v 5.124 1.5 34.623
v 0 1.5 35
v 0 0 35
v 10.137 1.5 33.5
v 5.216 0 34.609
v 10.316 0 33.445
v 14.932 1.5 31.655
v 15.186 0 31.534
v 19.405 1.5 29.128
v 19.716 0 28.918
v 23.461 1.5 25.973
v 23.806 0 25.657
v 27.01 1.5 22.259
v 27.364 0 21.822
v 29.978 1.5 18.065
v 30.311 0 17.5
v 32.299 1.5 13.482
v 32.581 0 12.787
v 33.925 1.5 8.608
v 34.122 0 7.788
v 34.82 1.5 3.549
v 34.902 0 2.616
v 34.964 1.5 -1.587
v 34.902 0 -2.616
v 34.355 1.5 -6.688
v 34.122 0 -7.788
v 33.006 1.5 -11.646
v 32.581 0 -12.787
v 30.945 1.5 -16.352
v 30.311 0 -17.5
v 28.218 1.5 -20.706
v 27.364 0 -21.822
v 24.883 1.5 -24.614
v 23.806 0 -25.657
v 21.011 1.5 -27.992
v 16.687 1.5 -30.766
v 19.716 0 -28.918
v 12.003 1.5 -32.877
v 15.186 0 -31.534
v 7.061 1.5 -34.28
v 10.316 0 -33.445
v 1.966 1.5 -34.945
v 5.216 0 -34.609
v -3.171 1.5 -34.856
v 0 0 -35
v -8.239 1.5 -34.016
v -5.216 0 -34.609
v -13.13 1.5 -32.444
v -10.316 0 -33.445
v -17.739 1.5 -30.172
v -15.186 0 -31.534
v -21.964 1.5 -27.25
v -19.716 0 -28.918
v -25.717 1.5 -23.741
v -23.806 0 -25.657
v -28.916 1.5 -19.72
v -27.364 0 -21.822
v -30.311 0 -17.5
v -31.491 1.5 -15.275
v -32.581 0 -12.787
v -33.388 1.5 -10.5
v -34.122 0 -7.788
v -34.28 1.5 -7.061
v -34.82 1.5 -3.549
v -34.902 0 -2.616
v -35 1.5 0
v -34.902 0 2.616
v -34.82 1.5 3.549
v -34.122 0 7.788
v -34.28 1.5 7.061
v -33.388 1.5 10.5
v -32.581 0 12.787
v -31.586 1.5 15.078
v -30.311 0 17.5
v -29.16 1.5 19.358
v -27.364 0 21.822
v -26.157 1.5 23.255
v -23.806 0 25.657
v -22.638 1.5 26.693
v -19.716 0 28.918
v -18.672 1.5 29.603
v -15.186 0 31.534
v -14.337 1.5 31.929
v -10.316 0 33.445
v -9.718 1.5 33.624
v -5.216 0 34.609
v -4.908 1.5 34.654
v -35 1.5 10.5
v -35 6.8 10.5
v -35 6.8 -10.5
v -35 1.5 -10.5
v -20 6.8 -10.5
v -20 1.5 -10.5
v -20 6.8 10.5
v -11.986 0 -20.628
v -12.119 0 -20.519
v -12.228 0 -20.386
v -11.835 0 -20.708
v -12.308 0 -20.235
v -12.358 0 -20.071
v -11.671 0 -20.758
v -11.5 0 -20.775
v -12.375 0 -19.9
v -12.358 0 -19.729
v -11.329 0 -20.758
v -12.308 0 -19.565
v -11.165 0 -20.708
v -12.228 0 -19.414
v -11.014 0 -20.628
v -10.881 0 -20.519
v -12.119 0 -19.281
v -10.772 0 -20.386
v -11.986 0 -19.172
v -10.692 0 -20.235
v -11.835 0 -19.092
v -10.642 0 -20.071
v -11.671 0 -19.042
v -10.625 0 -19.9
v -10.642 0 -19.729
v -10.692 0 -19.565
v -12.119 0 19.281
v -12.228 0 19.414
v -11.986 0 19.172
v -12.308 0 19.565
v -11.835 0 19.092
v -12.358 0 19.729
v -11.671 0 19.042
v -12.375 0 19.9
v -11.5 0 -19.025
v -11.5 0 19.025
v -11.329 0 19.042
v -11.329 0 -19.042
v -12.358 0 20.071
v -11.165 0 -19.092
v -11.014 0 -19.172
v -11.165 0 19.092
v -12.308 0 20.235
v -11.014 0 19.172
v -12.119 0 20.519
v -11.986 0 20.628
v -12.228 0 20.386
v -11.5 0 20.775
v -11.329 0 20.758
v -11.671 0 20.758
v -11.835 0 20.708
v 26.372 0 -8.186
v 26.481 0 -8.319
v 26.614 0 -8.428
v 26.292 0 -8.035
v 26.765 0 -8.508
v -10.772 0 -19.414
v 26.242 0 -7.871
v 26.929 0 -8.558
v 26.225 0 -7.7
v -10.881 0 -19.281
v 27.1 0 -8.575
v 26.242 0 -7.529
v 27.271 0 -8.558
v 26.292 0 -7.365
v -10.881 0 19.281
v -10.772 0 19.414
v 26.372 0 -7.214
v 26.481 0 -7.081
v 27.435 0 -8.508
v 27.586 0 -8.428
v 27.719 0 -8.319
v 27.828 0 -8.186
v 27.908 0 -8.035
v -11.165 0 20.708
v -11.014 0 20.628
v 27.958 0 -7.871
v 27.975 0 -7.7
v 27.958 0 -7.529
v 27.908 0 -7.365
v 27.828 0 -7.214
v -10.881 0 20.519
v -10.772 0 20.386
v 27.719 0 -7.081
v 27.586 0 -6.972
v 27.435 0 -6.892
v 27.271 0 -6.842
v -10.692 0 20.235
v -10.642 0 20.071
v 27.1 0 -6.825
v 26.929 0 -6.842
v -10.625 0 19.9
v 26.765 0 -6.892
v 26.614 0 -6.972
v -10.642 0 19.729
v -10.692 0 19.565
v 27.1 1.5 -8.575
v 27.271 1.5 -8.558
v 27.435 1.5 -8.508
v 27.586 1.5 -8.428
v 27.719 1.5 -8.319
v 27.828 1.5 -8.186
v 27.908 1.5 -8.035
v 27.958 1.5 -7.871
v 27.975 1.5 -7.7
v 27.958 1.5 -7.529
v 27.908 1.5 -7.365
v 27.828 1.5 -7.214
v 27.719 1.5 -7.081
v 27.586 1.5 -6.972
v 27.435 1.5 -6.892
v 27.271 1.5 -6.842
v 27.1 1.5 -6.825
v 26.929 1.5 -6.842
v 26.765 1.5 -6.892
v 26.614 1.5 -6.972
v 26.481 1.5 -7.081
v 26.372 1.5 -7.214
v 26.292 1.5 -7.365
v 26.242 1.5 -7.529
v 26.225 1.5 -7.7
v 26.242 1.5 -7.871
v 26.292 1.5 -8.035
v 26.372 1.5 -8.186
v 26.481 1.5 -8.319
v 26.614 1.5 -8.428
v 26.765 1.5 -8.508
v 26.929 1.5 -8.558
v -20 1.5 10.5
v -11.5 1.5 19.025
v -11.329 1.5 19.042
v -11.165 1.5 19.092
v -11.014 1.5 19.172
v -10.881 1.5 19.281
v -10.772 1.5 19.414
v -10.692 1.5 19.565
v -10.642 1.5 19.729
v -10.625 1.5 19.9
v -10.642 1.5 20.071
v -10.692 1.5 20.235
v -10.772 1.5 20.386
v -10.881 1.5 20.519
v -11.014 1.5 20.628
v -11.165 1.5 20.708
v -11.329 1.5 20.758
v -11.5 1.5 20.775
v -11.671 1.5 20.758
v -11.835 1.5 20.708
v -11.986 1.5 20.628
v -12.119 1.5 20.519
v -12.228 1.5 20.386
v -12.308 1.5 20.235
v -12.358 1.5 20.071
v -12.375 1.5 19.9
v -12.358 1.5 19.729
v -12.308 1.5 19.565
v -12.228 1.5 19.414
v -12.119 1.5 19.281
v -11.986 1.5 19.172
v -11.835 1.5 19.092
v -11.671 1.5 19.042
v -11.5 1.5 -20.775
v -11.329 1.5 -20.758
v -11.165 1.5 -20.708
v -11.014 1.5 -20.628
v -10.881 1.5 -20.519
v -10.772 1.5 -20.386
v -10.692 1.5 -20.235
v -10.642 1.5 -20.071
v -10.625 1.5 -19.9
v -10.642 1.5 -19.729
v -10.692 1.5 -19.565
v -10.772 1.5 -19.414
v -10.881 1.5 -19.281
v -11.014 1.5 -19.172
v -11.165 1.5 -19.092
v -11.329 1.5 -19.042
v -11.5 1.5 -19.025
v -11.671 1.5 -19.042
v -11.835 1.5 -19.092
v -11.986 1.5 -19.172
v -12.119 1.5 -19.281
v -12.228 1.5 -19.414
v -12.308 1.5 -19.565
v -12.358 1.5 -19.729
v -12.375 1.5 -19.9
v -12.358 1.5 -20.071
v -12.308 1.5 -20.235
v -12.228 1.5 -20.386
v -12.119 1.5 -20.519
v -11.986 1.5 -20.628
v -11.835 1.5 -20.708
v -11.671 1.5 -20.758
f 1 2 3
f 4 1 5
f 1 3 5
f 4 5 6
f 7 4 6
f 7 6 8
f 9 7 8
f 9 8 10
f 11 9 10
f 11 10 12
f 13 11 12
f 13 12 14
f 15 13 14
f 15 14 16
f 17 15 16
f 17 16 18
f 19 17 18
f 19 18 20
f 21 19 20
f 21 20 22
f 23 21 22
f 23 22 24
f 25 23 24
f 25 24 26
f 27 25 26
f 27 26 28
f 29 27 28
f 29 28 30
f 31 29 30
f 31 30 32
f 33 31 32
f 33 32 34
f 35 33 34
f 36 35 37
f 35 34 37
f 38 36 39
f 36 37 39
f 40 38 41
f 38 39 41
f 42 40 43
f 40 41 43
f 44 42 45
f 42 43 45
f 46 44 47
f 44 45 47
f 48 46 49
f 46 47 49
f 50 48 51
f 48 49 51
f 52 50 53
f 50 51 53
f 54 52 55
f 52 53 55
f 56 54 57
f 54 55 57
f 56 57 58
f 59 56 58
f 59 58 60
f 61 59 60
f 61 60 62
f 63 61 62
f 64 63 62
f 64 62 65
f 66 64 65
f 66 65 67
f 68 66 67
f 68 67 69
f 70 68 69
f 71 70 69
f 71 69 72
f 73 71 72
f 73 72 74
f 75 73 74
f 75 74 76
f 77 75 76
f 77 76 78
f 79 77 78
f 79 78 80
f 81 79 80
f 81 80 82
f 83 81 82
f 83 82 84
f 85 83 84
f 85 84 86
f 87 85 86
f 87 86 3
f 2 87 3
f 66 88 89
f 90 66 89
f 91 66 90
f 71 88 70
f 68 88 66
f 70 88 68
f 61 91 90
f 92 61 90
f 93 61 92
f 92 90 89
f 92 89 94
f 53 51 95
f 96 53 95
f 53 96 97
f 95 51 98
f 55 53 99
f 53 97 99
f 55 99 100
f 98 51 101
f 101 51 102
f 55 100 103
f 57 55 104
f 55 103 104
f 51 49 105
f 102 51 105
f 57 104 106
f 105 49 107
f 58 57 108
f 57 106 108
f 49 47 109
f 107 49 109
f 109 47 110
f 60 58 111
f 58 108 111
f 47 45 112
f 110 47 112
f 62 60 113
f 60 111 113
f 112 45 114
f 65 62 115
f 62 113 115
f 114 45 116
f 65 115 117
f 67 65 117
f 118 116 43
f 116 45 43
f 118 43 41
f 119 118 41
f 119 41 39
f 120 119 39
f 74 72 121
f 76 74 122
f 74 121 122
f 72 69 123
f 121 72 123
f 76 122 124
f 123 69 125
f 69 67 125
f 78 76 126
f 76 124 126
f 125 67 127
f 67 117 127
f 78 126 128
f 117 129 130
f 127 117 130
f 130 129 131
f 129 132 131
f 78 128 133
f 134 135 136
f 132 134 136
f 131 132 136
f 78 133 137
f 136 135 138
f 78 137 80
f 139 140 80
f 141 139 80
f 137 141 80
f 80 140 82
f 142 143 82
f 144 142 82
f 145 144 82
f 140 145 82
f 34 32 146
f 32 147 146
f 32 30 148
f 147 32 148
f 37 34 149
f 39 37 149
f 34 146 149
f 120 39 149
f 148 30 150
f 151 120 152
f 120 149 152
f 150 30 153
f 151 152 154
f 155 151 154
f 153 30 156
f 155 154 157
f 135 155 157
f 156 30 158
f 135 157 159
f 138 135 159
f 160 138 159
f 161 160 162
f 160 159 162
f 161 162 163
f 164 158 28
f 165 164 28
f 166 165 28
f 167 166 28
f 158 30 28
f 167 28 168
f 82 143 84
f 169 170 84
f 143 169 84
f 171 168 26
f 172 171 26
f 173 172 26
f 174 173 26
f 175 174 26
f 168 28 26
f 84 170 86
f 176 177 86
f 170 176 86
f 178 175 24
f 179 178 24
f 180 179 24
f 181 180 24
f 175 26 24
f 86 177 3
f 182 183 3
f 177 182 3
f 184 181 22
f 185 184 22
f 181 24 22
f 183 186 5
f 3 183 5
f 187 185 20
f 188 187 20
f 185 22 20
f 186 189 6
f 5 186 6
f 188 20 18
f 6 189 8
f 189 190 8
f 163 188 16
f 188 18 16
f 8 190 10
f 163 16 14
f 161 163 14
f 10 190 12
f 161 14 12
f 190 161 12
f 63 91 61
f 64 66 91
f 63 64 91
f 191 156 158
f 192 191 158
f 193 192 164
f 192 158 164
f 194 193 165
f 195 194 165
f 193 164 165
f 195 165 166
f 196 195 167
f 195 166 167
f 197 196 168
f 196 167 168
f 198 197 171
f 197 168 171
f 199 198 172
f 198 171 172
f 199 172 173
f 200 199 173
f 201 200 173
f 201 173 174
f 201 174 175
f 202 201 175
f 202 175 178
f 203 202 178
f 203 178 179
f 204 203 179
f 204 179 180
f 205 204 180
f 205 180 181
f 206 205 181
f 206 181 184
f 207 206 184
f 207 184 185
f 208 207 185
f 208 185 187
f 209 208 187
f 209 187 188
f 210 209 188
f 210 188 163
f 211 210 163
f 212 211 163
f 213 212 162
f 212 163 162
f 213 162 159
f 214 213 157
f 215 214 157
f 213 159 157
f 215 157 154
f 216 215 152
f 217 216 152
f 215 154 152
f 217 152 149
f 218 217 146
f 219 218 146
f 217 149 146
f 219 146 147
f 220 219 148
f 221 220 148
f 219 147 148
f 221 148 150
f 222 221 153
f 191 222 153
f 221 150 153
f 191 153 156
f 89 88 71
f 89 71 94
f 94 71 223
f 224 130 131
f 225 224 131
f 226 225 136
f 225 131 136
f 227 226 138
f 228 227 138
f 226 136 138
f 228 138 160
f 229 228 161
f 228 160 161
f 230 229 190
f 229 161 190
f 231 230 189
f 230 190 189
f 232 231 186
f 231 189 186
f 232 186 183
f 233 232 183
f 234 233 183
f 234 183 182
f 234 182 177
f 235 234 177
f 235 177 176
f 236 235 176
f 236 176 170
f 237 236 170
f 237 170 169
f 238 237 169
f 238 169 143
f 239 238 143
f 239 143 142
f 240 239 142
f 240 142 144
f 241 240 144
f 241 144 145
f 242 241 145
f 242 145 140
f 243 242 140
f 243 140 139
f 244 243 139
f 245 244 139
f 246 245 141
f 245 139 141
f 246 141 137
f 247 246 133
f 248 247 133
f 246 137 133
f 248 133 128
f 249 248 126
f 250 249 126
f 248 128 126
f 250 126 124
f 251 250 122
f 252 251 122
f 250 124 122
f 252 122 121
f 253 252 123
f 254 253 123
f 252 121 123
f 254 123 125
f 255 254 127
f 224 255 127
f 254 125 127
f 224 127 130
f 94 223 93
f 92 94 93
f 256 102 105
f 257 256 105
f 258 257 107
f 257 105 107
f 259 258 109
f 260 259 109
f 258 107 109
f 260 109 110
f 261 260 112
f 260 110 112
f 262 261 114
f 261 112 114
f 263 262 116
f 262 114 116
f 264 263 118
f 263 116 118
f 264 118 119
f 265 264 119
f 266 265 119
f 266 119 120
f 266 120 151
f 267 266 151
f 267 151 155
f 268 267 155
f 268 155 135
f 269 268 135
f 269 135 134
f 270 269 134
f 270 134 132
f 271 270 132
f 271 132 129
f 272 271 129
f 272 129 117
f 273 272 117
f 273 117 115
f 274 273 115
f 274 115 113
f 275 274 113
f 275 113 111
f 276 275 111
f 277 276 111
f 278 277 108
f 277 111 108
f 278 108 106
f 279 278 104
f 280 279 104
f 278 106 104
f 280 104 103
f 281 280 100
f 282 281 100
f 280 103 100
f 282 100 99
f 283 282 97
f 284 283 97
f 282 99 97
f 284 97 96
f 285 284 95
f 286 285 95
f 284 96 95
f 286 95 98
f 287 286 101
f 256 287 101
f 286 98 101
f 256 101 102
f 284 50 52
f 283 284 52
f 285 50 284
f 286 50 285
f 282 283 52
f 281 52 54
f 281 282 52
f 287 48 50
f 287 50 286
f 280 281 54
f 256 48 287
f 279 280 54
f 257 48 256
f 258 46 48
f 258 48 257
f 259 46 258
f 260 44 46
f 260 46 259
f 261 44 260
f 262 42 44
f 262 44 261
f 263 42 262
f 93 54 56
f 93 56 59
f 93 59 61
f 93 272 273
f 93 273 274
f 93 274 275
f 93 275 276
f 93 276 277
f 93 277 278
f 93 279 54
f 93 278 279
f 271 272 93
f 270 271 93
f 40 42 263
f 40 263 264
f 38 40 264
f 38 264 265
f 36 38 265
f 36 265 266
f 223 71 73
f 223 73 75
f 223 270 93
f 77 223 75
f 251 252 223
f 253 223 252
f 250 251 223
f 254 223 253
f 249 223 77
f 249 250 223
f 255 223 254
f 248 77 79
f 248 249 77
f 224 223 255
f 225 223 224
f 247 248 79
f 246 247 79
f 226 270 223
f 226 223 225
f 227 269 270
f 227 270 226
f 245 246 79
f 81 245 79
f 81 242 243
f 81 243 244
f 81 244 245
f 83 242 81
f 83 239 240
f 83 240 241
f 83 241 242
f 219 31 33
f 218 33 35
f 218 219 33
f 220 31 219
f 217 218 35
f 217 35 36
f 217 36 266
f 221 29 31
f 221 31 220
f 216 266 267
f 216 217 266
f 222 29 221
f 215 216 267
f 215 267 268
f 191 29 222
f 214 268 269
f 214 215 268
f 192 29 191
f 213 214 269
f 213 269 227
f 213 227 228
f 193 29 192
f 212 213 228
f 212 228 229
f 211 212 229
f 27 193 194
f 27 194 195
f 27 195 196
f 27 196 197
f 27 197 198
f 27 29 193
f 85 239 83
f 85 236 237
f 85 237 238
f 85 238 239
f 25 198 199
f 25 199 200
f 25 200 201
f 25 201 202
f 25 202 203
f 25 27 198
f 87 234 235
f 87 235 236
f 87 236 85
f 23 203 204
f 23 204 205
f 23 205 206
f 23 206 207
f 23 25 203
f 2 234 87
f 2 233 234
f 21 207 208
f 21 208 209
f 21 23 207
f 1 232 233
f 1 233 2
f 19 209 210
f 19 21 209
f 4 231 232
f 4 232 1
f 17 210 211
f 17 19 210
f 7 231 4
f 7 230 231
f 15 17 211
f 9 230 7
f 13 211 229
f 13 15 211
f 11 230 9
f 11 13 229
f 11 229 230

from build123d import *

# Parameters (mm, degrees)
SKETCH1_R                      = 35
BOSS_EXTRUDE1_DEPTH            = 1.5
SKETCH4_W                      = 15
SKETCH4_H                      = 21
BOSS_EXTRUDE2_DEPTH            = 5.3
TAP_DRILL_FOR_M2_2X0_45_TAP1_D = 1.75


with BuildPart() as part:
    # Sketch1 → Boss-Extrude1 (new body)
    with BuildSketch(Plane(origin=(0, 0, 0), x_dir=(1, 0, 0), z_dir=(0, 1, 0))):
        with Locations(Location((0, 0, 0), (0, 0, 270))):
            Circle(SKETCH1_R)
    extrude(amount=BOSS_EXTRUDE1_DEPTH)

    # Sketch4 → Boss-Extrude2 (add)
    with BuildSketch(Plane(origin=(0, 1.5, 0), x_dir=(1, 0, 0), z_dir=(0, 1, 0))):
        with Locations((-27.5, 0)):
            Rectangle(SKETCH4_W, SKETCH4_H)
    extrude(amount=BOSS_EXTRUDE2_DEPTH)

    # Tap Drill for M2.2x0.45 Tap1 (through all)
    with Locations(Plane(origin=(-11.5, 1.5, -19.9), x_dir=(0, 0, 1), z_dir=(0, 1, 0))):
        with Locations((0, 0), (12.2, 38.6), (39.8, 0)):
            Hole(TAP_DRILL_FOR_M2_2X0_45_TAP1_D / 2)


solid = part.part
